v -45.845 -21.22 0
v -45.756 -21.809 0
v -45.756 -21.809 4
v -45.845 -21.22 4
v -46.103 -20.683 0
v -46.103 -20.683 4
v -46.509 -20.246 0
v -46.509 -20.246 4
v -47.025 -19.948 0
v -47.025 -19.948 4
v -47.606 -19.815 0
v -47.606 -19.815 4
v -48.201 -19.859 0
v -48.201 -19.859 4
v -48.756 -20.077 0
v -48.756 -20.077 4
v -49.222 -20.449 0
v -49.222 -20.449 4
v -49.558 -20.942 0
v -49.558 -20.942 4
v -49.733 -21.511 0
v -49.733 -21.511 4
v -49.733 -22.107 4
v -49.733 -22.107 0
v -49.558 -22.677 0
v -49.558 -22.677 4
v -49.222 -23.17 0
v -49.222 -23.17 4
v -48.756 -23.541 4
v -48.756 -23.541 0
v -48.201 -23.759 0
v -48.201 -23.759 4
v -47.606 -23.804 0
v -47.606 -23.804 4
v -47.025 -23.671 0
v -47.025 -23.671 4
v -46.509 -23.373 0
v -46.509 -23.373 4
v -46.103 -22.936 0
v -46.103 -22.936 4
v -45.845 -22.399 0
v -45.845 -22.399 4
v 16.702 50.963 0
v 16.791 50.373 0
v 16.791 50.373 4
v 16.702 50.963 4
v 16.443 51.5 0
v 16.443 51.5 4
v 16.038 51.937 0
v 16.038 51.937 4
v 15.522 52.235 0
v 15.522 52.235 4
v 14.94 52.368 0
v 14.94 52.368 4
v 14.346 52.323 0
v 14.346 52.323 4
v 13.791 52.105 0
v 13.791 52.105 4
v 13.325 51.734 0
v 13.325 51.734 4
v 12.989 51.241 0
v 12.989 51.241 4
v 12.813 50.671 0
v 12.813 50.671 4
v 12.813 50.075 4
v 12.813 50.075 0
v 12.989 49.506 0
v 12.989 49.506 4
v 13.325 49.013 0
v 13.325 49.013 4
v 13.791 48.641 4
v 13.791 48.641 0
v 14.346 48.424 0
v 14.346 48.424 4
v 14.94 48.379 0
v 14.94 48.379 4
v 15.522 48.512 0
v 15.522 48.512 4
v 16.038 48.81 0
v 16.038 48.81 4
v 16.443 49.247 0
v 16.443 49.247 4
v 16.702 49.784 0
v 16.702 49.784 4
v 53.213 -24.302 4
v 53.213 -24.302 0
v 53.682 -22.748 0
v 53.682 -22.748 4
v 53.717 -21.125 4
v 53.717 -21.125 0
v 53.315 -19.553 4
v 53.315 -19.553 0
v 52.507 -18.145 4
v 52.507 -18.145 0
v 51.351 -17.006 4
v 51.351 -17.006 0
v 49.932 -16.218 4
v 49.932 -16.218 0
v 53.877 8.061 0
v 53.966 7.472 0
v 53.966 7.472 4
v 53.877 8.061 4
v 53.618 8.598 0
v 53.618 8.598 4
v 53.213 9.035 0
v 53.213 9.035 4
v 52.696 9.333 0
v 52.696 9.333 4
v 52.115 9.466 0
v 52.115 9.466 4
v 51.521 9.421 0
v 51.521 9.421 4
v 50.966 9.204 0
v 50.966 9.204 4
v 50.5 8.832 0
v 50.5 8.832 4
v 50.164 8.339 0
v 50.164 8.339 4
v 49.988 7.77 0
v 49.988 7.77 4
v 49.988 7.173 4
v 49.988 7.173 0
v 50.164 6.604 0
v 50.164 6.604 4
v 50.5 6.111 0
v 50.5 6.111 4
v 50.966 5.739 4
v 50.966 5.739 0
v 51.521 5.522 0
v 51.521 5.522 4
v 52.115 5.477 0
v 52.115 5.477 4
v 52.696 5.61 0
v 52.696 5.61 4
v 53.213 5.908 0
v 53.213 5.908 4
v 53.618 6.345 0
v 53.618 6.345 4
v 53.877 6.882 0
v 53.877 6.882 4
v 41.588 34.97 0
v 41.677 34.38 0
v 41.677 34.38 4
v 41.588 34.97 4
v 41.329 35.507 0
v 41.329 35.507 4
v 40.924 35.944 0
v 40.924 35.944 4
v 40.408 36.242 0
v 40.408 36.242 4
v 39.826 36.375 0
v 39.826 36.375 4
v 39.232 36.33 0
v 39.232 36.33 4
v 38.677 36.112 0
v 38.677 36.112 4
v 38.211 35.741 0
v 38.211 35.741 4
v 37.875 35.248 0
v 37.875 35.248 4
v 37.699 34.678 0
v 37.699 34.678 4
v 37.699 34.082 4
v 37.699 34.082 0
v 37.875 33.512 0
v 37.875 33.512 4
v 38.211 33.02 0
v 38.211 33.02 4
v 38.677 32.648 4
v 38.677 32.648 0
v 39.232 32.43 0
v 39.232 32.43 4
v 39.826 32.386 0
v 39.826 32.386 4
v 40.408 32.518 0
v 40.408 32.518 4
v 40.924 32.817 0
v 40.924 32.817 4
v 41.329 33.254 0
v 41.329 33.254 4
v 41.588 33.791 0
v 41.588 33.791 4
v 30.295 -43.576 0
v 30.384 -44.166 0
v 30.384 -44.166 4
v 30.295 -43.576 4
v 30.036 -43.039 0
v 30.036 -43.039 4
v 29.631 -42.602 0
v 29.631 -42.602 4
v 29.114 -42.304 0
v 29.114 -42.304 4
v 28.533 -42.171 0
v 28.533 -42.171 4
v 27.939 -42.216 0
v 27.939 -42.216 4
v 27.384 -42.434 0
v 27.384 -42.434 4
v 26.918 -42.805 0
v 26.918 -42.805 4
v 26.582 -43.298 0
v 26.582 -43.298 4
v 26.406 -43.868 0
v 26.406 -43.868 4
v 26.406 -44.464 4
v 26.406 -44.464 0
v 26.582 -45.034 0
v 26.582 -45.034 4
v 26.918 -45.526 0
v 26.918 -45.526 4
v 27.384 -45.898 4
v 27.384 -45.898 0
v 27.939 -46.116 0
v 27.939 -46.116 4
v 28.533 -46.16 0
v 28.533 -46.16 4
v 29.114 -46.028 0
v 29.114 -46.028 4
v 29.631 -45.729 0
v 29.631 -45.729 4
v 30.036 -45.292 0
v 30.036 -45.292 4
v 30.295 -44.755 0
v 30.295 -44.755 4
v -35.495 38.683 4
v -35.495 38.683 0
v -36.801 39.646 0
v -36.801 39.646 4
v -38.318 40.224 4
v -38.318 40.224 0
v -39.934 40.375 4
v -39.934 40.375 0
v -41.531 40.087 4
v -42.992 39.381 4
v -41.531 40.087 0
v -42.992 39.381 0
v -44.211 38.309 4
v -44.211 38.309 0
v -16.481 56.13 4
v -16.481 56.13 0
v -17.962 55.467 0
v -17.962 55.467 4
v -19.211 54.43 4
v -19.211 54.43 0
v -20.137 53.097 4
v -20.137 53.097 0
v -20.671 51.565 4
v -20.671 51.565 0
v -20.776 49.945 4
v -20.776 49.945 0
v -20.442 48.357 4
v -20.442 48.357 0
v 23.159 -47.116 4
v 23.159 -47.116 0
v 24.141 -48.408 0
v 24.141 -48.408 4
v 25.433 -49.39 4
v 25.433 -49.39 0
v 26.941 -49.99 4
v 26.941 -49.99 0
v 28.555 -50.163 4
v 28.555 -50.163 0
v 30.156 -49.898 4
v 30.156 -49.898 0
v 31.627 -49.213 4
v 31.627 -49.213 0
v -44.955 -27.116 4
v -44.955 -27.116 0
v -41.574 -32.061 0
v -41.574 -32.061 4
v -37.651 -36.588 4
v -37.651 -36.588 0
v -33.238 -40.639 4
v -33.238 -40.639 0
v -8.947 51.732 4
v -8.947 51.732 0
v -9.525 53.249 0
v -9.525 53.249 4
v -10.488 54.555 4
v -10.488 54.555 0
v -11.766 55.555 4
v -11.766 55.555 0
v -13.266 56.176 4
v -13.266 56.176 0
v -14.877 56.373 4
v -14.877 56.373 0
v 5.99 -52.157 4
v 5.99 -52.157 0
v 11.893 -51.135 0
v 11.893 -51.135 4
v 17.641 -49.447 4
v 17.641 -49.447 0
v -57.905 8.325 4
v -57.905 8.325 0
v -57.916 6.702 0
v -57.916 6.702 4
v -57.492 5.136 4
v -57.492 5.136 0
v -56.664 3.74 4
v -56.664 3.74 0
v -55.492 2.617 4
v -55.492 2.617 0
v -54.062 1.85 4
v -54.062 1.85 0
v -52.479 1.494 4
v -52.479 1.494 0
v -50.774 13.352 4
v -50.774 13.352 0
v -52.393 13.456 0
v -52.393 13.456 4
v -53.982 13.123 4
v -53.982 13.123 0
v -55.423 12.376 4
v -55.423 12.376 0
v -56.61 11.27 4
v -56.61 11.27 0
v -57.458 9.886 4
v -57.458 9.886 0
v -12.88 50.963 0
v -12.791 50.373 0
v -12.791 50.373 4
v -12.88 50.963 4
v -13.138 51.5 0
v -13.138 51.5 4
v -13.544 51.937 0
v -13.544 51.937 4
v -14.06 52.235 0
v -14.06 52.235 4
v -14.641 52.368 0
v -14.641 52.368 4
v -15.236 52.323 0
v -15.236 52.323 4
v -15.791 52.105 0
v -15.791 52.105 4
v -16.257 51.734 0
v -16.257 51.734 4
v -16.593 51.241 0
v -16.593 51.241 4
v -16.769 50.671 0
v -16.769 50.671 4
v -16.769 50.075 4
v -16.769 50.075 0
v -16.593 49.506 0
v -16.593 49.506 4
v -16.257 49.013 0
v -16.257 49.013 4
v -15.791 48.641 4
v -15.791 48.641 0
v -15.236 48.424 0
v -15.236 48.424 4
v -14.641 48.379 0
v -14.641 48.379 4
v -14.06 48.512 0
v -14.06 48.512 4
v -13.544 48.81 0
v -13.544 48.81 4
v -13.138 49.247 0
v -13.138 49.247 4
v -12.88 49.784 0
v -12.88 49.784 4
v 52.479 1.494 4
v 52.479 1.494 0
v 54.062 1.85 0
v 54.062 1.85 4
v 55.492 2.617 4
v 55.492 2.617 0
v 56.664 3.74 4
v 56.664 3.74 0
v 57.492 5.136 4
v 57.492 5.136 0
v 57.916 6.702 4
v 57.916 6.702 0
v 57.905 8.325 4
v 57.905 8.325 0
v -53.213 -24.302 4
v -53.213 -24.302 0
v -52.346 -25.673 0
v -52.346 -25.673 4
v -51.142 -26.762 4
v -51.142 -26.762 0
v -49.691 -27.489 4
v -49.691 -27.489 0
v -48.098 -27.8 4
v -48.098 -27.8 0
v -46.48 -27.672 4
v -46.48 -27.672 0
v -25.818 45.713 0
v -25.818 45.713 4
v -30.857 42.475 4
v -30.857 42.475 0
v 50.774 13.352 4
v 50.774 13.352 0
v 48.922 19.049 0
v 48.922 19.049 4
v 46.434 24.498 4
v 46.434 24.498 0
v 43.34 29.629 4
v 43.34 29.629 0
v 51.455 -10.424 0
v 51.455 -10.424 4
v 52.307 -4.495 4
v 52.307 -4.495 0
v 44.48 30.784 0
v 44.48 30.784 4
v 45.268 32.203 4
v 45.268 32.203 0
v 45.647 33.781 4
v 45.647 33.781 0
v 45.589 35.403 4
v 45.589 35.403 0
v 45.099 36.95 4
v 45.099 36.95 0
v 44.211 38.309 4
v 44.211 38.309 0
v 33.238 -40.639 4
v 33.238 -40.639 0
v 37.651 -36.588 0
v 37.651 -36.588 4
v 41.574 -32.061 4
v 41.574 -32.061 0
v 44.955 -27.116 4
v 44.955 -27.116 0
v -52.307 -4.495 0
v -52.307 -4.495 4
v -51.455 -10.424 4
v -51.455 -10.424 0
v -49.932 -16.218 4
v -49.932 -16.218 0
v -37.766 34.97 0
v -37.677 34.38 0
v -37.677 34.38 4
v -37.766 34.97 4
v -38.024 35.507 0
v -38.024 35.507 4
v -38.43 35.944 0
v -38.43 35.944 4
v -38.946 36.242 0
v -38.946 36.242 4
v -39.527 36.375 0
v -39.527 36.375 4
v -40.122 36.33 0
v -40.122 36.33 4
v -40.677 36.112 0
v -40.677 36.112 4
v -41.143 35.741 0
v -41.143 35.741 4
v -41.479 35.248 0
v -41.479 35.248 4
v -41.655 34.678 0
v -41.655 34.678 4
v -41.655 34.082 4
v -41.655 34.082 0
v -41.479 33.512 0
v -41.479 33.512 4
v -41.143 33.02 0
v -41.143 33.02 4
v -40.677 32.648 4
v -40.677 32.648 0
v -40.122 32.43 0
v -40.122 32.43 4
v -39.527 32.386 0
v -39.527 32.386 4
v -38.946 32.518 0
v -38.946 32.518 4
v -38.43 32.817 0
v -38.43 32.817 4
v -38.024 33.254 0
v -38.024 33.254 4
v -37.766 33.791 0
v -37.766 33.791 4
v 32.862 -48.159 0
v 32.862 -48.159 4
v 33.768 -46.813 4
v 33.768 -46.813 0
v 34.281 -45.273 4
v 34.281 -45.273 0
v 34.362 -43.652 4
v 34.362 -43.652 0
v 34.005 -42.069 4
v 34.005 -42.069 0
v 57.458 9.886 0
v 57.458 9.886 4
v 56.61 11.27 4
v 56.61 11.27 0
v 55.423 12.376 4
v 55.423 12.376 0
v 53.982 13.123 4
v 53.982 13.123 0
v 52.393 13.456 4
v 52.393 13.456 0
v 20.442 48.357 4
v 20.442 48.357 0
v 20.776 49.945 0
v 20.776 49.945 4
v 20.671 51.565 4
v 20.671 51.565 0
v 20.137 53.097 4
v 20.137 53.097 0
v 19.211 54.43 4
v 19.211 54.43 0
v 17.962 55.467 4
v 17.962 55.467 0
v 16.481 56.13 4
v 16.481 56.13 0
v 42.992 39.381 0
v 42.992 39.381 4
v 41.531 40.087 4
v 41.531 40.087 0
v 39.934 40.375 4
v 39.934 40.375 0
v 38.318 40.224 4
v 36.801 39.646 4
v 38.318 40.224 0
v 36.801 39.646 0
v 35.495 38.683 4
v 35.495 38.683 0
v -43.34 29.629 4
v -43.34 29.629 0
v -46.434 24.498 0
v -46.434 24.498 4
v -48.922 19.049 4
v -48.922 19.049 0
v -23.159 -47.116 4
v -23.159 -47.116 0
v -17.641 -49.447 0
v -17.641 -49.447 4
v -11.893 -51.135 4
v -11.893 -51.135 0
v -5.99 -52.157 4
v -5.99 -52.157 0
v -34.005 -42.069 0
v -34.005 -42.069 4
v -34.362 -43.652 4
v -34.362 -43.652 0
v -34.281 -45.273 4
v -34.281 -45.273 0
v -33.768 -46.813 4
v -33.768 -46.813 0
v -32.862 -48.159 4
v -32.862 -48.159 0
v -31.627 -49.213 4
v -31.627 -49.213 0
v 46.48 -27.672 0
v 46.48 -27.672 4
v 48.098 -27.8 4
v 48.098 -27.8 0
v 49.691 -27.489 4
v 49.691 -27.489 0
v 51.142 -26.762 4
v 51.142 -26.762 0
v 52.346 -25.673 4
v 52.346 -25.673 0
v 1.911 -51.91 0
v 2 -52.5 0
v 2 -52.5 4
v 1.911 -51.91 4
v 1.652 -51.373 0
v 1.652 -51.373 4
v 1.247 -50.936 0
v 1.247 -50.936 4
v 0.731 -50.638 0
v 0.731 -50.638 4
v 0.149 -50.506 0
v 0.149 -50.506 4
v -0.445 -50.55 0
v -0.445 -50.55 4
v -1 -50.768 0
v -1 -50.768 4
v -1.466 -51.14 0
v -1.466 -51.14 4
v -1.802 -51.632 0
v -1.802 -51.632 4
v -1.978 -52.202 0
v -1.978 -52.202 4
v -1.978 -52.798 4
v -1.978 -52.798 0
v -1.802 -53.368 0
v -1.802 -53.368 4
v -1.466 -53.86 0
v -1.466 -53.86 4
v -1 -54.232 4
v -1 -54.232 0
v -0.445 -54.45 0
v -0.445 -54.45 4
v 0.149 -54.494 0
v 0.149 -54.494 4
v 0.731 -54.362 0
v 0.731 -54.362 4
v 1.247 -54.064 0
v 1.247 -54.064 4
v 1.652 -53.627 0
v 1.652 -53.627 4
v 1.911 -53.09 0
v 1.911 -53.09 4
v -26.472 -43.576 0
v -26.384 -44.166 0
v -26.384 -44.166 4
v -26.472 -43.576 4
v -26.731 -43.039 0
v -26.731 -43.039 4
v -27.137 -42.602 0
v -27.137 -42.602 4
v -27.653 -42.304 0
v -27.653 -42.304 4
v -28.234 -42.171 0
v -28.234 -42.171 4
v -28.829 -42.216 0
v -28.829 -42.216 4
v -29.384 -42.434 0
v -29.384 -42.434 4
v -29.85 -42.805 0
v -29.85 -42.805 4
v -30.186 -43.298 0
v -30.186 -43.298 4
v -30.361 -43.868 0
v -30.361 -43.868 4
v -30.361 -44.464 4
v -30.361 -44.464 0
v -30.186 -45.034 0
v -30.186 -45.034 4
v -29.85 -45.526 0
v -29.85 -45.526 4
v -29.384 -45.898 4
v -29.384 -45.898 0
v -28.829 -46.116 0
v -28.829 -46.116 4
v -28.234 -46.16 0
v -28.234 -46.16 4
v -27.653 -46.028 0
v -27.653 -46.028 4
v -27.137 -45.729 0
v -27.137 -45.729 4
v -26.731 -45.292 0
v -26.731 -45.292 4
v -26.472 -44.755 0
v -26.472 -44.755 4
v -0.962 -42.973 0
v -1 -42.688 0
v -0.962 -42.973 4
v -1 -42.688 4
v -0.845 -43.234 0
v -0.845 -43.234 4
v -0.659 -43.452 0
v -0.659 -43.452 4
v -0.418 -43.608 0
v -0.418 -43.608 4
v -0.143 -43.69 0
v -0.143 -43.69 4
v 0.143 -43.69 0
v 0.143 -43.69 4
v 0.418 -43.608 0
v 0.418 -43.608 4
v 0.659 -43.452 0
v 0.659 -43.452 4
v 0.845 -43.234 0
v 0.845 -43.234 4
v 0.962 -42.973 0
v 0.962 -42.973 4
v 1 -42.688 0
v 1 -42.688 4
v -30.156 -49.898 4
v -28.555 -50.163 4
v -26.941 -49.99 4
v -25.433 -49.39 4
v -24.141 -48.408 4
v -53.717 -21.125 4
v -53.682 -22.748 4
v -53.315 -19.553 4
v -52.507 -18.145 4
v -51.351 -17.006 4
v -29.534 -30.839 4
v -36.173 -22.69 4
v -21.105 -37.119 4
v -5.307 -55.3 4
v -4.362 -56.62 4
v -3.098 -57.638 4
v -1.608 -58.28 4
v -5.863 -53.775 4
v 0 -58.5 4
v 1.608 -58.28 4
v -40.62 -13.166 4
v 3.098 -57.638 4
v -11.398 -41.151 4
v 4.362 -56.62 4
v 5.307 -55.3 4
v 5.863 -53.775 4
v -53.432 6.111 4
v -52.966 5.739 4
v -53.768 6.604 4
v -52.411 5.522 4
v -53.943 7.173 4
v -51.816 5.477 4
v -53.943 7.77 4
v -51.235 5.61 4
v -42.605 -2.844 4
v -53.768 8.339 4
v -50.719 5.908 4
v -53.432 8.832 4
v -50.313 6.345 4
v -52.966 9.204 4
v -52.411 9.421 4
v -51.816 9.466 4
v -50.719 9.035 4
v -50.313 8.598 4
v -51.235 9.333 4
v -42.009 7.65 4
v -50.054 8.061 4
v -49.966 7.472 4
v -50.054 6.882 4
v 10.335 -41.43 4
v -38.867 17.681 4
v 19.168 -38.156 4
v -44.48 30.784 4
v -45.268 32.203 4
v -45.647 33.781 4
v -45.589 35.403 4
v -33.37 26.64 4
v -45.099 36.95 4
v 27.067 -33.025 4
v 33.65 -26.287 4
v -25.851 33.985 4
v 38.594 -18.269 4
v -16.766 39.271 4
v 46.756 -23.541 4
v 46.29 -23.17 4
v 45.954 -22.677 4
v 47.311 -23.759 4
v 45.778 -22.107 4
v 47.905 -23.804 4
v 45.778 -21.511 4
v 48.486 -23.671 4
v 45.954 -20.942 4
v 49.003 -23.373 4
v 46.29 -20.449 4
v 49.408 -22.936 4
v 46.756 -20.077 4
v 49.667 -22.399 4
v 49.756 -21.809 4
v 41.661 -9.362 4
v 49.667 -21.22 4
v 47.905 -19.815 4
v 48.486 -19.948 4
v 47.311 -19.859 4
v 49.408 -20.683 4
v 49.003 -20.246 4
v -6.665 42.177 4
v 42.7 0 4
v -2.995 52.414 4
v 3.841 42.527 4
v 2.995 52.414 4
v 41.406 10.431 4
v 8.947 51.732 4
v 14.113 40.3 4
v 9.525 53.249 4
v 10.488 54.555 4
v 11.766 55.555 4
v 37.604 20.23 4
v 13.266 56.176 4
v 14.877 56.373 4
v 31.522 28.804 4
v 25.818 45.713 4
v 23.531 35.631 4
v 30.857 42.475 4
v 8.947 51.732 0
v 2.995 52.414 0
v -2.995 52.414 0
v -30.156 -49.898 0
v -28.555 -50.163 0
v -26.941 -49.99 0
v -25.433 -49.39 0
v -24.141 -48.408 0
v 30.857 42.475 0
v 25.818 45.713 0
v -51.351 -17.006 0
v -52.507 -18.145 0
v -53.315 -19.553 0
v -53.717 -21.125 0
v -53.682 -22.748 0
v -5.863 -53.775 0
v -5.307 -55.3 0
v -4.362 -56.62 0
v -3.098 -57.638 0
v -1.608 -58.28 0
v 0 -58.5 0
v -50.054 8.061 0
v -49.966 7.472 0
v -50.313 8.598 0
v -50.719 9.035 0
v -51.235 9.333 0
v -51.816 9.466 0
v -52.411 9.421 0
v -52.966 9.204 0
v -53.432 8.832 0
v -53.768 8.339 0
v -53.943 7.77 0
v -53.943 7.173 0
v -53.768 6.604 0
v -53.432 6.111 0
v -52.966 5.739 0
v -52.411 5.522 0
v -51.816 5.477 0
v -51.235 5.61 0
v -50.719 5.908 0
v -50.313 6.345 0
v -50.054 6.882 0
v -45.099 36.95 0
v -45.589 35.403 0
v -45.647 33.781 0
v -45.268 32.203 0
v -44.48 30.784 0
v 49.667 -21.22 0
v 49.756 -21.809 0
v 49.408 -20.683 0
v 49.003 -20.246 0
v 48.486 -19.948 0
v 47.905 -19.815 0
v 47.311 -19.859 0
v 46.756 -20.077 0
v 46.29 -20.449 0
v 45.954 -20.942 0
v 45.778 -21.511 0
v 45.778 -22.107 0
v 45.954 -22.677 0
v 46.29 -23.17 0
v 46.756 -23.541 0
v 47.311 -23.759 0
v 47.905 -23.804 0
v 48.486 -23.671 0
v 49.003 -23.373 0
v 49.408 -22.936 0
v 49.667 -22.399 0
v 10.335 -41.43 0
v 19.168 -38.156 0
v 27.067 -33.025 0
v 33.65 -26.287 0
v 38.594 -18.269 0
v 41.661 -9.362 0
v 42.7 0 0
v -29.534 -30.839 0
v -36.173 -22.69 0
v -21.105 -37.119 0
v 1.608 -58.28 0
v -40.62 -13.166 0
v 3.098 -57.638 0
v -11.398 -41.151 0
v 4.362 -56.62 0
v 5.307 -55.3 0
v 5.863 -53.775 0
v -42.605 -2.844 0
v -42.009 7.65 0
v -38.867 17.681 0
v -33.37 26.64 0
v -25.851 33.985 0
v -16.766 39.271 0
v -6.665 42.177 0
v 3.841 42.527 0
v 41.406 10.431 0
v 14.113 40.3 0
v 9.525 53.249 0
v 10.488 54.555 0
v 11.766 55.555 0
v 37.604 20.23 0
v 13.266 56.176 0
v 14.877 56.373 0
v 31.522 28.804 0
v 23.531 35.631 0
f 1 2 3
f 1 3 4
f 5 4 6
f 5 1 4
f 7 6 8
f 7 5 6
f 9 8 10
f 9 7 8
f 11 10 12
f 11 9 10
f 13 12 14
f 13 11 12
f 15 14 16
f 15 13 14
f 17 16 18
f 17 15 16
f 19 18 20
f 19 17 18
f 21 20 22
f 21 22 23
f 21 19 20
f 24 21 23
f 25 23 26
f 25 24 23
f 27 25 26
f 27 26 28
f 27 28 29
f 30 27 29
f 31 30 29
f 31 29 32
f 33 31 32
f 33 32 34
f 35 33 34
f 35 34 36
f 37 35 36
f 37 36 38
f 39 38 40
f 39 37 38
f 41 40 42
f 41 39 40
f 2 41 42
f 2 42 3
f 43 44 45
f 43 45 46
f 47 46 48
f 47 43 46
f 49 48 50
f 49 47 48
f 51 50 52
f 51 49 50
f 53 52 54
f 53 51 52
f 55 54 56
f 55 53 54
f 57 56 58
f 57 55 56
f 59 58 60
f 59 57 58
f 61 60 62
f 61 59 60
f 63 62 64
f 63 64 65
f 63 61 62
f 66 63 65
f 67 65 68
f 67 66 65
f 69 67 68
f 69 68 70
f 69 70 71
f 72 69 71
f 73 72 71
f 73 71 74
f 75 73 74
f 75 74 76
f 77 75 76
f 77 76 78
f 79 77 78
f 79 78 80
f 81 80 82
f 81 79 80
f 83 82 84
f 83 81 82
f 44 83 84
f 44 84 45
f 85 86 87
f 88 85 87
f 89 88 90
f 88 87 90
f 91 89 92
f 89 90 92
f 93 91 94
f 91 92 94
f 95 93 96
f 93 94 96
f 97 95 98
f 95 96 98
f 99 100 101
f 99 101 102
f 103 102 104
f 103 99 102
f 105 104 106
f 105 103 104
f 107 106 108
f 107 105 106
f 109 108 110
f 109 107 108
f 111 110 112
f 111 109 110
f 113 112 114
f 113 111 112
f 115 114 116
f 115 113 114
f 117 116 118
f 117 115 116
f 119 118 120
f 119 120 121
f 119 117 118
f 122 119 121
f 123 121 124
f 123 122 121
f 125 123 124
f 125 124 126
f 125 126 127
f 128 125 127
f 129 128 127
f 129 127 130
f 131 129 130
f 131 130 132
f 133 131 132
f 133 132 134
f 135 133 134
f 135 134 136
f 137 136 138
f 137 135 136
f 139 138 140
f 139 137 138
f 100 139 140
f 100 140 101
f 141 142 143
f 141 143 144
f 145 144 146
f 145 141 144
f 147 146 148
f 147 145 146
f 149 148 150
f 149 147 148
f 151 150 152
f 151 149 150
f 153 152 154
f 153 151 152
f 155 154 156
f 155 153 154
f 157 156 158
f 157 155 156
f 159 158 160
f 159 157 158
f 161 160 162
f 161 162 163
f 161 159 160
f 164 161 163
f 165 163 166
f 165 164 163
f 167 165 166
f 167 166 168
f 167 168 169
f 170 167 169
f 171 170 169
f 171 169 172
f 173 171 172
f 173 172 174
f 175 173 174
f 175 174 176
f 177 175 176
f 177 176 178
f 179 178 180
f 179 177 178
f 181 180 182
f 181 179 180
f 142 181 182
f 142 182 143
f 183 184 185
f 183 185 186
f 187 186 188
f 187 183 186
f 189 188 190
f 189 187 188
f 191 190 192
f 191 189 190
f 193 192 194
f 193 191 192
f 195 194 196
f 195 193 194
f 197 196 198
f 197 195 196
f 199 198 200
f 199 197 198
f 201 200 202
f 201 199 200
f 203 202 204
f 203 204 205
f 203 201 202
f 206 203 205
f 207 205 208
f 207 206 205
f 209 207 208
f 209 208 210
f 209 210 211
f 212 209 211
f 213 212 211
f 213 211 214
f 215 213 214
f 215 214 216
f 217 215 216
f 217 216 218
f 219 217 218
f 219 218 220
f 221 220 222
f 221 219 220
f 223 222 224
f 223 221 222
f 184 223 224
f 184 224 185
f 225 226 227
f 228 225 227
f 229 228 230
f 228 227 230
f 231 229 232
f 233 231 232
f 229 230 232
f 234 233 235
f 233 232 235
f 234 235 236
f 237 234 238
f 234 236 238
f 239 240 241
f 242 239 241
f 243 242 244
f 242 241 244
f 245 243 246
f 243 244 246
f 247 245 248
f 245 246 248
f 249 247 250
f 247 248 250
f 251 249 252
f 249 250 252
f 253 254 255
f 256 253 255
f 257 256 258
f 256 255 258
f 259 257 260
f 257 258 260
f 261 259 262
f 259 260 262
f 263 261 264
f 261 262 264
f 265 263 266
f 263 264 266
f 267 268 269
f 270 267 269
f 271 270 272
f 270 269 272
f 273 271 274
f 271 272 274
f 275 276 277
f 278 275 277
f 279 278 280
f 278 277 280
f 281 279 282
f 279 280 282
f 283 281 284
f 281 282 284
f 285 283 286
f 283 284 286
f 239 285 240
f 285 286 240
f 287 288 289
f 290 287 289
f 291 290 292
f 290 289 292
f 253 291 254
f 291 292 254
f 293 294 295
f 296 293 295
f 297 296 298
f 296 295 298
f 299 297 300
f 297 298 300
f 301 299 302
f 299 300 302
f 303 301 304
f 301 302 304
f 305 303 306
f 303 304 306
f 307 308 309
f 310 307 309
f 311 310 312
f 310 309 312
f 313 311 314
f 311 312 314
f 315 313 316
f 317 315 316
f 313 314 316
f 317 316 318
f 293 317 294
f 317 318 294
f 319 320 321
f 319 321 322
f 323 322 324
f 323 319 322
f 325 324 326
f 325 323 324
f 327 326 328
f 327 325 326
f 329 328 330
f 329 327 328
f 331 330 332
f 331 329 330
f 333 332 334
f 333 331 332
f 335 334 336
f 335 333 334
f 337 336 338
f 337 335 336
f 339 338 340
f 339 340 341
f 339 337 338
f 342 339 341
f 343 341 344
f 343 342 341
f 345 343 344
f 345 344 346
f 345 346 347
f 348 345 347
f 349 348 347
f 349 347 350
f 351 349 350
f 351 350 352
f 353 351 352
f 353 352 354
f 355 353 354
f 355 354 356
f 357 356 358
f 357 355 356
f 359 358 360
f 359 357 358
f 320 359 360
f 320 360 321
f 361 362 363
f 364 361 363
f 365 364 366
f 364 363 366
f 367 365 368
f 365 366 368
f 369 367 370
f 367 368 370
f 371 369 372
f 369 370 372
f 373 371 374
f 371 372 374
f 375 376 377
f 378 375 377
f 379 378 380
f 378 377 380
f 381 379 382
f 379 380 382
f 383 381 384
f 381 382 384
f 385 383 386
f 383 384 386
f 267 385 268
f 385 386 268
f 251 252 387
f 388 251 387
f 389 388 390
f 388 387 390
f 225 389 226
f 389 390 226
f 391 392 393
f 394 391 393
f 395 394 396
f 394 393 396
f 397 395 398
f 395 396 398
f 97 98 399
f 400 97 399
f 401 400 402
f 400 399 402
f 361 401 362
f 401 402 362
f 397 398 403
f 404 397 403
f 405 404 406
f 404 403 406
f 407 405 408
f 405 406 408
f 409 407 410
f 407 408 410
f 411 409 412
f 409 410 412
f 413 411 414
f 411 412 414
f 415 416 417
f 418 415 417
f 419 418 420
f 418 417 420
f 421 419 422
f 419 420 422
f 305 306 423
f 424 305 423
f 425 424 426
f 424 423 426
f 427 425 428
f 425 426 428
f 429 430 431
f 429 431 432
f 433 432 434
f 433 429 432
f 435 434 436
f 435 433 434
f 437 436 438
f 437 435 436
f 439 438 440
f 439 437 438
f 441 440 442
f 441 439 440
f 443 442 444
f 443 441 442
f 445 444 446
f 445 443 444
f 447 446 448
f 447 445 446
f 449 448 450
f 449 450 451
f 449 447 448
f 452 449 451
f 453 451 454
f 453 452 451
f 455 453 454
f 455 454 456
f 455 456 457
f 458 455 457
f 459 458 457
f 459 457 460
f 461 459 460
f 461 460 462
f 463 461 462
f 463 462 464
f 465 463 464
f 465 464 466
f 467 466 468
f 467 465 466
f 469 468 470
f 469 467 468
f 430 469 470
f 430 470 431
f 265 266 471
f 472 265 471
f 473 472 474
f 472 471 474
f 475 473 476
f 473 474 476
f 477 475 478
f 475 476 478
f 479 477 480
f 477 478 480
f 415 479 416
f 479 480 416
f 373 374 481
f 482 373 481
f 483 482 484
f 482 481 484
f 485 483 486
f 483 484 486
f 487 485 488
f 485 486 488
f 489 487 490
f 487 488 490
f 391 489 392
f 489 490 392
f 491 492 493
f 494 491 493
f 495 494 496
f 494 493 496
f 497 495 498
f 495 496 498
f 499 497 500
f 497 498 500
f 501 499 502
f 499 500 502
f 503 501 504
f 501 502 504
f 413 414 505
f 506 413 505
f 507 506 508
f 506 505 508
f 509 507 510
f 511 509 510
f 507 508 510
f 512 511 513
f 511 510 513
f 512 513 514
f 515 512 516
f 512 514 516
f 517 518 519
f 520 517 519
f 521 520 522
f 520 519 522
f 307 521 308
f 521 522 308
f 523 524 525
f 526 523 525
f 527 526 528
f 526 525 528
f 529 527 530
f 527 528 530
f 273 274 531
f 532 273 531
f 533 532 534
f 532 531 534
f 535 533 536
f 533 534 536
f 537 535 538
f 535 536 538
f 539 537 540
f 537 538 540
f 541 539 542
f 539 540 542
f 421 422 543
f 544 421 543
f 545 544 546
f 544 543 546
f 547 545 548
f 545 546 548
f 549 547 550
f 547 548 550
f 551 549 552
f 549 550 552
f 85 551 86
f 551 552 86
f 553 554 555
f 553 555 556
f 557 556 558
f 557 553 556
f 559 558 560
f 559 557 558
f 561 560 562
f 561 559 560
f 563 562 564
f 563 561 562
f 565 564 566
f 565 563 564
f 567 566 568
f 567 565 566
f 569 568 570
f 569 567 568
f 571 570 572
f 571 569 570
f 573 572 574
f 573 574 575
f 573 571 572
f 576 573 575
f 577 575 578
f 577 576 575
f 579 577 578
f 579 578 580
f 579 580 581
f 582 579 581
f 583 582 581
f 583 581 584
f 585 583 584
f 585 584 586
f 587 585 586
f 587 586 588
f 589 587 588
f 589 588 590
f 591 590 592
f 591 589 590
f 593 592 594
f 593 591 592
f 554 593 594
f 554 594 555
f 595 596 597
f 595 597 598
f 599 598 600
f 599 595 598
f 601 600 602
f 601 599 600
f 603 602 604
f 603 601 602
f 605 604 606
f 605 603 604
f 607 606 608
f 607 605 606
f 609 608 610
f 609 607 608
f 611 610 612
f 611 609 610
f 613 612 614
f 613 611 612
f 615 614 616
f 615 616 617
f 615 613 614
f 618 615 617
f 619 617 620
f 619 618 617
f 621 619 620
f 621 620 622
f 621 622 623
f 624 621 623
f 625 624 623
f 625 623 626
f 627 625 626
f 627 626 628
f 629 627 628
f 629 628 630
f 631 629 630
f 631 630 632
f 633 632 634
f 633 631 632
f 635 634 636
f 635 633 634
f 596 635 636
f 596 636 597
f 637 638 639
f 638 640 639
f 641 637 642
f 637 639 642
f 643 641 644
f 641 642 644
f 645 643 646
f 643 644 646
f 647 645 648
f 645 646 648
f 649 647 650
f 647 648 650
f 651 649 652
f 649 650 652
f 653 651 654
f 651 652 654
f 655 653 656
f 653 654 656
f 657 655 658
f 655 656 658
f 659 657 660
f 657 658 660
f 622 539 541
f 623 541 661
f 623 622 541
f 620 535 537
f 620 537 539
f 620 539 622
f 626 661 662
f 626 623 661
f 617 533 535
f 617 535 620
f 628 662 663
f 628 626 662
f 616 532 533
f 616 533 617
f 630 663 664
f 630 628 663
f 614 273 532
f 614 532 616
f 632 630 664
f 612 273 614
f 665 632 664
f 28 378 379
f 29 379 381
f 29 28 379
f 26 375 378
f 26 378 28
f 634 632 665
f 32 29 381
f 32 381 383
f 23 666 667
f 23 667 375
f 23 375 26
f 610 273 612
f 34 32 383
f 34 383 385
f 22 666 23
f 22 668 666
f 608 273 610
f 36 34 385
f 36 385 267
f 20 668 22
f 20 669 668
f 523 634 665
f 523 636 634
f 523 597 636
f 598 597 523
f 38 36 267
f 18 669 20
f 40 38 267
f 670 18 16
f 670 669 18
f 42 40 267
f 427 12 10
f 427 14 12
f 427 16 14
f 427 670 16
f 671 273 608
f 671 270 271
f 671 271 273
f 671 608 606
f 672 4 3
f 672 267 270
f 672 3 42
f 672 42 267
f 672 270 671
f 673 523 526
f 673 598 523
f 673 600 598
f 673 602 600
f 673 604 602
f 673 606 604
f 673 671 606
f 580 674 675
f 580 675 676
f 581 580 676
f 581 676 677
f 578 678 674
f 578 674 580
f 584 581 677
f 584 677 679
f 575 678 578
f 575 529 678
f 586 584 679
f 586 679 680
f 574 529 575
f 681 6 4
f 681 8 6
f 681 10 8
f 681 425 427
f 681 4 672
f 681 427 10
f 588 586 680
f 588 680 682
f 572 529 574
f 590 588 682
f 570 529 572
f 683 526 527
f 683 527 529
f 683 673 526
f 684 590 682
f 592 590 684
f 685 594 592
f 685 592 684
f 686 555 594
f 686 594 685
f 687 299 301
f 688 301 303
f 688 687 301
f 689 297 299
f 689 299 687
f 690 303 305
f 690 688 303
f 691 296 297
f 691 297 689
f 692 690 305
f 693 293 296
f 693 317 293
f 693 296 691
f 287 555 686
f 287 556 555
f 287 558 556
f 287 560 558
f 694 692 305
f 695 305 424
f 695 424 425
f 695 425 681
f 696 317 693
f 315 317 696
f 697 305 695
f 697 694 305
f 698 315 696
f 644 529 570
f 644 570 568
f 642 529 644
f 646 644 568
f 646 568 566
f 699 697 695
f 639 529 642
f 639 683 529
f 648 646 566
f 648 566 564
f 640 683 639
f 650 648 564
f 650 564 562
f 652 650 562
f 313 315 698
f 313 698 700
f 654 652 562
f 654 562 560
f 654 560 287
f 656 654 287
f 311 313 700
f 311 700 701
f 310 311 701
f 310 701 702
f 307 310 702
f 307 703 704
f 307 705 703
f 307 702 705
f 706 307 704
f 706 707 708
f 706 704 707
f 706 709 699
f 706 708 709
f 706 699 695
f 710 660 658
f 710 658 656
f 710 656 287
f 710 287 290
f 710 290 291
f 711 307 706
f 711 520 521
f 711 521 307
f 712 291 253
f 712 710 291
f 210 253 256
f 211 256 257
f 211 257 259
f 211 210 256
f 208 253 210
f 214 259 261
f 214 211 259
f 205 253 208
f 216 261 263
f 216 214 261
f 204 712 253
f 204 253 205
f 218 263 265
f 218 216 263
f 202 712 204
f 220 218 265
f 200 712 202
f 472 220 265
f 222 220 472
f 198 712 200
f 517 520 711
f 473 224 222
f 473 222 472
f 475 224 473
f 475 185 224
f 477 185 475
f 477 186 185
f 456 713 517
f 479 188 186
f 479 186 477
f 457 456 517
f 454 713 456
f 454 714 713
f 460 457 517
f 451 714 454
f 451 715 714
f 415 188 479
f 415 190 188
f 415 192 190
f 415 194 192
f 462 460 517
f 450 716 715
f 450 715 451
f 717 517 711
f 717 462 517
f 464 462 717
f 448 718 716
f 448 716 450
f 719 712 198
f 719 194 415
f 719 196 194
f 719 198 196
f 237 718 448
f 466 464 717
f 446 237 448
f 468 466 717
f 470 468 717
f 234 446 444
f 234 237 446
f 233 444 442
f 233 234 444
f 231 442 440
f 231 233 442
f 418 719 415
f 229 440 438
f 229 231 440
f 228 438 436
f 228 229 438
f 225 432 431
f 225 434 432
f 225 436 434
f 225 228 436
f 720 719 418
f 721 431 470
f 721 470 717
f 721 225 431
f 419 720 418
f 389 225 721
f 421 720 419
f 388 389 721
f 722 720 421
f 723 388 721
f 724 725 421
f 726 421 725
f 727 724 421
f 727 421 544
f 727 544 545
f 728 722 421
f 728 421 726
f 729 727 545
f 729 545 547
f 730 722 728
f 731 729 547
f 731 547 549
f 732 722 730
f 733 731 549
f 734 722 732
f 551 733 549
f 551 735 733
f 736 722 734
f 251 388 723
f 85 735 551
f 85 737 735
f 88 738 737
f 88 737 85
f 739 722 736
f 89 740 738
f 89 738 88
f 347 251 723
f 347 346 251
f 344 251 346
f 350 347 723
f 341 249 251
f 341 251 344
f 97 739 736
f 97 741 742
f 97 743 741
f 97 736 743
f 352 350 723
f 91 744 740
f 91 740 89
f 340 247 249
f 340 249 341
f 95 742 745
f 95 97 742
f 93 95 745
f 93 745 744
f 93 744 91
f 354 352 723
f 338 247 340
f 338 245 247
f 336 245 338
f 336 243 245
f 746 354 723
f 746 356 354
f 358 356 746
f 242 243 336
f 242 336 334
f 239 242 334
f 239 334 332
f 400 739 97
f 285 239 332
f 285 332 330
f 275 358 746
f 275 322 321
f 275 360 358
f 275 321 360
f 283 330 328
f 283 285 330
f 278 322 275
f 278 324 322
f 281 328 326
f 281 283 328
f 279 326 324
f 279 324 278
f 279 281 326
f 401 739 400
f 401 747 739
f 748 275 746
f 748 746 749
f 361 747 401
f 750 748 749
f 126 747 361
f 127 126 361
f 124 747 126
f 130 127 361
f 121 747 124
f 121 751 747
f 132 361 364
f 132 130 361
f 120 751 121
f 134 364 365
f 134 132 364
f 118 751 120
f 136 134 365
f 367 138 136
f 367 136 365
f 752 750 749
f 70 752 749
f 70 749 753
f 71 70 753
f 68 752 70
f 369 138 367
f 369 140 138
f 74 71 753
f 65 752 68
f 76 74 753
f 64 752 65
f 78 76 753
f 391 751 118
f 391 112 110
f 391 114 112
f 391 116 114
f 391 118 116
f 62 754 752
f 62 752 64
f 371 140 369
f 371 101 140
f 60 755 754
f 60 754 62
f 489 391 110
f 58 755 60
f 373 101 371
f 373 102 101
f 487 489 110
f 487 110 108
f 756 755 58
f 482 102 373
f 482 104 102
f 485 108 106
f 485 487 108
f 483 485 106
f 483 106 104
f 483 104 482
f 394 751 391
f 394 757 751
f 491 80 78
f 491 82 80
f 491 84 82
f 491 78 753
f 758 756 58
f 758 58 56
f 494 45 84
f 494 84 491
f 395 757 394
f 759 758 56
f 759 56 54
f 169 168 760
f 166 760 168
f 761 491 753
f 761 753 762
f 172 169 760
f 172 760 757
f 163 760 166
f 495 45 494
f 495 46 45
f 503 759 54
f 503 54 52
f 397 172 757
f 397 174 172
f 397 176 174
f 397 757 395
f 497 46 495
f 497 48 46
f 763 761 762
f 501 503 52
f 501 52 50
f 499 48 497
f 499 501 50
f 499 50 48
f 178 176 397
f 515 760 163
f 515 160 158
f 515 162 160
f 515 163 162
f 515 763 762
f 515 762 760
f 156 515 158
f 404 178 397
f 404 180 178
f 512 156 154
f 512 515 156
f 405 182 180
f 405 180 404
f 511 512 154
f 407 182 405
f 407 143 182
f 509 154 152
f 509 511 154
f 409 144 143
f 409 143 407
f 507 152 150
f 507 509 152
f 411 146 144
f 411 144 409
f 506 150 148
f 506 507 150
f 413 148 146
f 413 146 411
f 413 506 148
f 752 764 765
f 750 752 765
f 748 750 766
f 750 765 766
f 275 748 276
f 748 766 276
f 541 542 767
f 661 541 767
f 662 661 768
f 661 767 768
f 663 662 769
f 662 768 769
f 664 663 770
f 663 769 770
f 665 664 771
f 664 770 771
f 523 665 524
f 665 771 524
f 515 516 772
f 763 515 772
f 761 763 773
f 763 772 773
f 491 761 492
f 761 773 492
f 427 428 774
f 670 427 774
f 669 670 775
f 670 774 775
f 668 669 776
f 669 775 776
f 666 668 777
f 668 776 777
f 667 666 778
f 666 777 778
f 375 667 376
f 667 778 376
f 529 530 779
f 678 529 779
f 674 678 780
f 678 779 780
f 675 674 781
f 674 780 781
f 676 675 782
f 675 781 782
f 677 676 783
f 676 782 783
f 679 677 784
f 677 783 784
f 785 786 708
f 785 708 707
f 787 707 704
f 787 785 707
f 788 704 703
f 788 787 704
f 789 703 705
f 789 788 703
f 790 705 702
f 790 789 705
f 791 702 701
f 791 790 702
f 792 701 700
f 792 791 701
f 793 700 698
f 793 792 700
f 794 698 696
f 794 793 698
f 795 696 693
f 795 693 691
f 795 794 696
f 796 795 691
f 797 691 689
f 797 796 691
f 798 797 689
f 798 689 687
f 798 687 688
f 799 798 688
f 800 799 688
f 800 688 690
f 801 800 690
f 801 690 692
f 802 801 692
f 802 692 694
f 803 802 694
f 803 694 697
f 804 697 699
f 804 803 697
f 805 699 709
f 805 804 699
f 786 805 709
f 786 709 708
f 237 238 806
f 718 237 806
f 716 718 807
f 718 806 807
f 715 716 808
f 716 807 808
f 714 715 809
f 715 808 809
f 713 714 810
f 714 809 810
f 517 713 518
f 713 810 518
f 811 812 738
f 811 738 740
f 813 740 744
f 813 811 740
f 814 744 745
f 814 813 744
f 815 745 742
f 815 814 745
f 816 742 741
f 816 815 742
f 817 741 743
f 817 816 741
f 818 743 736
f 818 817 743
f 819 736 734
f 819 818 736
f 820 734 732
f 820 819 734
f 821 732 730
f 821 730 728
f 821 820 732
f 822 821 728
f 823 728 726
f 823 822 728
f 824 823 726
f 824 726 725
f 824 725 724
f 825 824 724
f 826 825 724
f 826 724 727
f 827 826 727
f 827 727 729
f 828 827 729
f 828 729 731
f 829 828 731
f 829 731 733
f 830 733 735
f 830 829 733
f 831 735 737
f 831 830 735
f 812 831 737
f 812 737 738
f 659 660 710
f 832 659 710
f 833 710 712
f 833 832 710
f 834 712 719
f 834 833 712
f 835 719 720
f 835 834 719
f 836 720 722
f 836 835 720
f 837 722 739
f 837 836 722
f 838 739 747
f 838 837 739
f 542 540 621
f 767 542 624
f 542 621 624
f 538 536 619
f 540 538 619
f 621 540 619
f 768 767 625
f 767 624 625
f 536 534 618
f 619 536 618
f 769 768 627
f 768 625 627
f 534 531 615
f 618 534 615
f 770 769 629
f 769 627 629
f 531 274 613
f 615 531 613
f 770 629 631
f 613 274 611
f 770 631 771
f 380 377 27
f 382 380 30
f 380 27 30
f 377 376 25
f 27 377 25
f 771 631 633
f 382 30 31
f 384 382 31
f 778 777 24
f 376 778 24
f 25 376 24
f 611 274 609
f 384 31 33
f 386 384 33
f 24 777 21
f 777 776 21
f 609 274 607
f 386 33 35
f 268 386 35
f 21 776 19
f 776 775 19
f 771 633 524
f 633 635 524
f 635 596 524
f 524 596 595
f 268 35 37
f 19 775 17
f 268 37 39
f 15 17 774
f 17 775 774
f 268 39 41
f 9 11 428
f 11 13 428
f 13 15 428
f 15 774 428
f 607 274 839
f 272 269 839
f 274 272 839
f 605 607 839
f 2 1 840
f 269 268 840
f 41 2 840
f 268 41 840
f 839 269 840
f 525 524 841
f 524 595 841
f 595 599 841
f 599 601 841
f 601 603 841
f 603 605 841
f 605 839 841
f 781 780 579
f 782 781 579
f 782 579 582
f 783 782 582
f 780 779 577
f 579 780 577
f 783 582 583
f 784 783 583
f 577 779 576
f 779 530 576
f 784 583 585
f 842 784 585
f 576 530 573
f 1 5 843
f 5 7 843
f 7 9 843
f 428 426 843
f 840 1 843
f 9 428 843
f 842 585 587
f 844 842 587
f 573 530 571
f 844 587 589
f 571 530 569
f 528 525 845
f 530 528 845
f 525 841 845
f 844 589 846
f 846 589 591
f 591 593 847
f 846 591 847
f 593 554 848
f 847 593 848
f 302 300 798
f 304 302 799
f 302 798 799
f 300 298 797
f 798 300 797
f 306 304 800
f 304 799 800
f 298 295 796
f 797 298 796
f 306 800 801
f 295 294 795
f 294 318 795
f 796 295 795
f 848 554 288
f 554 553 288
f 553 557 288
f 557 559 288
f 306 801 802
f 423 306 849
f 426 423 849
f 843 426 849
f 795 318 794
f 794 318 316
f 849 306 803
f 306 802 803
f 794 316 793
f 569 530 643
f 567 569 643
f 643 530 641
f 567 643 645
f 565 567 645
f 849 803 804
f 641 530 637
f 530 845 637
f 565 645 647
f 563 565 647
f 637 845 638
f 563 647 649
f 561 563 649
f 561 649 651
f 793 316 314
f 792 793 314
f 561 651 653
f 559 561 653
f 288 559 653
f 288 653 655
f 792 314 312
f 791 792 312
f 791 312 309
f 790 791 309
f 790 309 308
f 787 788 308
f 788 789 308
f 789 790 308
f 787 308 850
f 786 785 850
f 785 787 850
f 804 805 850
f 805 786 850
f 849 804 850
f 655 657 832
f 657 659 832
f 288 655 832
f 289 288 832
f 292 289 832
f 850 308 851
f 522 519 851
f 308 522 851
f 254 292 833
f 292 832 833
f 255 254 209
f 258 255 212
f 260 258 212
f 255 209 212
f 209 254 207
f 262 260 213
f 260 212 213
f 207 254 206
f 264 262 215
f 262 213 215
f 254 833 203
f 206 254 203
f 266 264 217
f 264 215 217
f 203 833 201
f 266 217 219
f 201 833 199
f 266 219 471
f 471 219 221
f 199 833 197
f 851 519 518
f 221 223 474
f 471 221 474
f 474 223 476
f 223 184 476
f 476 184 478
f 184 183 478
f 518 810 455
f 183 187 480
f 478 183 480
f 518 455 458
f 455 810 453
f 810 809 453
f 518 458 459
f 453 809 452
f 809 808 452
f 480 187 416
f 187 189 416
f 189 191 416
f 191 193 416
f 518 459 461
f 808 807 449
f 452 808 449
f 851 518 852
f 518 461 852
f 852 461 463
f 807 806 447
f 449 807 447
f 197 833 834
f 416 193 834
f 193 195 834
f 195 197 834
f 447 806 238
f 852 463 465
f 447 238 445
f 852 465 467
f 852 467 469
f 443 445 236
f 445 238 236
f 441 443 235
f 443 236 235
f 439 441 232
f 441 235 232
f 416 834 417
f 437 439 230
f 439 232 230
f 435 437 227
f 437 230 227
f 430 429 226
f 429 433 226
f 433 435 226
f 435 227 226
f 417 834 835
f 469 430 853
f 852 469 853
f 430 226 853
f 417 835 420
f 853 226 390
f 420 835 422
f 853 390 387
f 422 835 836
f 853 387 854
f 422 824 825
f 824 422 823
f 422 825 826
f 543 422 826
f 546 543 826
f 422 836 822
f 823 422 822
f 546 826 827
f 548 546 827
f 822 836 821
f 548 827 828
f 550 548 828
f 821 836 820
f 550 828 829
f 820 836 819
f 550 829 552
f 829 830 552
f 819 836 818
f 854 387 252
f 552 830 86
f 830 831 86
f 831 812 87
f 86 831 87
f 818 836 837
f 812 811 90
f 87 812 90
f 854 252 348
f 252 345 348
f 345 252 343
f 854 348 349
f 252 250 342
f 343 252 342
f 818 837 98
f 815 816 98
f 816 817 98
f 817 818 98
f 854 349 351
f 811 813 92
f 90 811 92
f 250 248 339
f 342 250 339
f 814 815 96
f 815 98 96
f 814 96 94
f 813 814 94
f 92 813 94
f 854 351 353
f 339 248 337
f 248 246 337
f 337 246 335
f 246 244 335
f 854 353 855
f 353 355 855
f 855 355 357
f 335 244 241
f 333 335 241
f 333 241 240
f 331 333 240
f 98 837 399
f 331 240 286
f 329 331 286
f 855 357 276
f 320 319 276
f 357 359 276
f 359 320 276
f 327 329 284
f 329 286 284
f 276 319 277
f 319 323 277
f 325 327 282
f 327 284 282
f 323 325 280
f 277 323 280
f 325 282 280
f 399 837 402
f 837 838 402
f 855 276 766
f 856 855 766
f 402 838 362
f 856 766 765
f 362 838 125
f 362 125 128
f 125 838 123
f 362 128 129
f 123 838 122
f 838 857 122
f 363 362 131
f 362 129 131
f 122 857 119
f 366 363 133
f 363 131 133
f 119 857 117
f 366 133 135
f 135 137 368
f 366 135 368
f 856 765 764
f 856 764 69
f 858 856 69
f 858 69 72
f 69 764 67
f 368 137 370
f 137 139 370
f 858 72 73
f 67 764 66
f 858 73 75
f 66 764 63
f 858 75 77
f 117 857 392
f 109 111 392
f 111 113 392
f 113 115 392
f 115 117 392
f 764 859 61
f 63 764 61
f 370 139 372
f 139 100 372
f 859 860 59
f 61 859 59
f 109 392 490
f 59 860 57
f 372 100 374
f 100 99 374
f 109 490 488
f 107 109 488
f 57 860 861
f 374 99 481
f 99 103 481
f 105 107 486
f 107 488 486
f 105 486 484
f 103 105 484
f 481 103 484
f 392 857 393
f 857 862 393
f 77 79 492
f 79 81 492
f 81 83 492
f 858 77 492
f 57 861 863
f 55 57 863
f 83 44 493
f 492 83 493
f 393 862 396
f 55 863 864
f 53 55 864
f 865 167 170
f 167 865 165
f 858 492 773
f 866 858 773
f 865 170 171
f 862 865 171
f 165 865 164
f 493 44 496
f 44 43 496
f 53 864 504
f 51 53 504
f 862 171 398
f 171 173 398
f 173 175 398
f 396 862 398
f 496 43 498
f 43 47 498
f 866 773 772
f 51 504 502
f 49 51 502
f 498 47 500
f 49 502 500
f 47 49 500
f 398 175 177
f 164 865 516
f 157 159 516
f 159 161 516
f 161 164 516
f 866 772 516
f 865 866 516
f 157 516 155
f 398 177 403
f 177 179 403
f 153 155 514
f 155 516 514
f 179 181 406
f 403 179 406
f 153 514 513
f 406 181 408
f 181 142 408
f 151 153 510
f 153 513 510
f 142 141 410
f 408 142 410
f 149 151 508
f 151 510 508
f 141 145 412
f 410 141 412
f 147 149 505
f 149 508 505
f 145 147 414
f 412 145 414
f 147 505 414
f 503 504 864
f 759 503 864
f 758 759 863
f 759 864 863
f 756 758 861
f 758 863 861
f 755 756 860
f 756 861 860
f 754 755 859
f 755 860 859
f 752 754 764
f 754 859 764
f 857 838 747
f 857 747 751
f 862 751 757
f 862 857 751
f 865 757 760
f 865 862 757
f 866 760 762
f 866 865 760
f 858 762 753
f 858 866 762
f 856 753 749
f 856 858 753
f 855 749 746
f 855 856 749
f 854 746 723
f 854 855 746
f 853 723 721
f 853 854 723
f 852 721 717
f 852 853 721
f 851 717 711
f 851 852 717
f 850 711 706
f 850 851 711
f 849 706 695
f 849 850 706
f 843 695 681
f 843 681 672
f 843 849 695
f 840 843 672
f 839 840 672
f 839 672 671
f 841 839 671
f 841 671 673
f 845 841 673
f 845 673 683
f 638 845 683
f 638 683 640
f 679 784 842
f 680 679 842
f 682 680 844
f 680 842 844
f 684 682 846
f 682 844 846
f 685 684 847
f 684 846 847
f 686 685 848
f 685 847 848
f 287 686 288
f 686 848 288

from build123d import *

# Parameters (mm, degrees)
SKETCH_1_R          = 42.7
SKETCH_1_R_2        = 2
EXTRUDE_1_DEPTH     = 4
SKETCH_2_R          = 1
CUT_EXTRUDE_1_DEPTH = 4


with BuildPart() as part:
    # 草图1 → 凸台-拉伸1 (new body)
    with BuildSketch(Plane.XY):
        with BuildLine():
            ThreePointArc((-57.90455435, 8.325418039), (-56.664135325, 3.740040393), (-52.478752132, 1.493510837))
            ThreePointArc((-52.478752132, 1.493510837), (-51.965625699, -7.471529009), (-49.932223308, -16.217986173))
            ThreePointArc((-49.932223308, -16.217986173), (-53.315148558, -19.552674205), (-53.213471728, -24.301778261))
            ThreePointArc((-53.213471728, -24.301778261), (-49.690922522, -27.488622249), (-44.95538855, -27.115734184))
            ThreePointArc((-44.95538855, -27.115734184), (-39.676852654, -34.380188532), (-33.237553958, -40.63883619))
            ThreePointArc((-33.237553958, -40.63883619), (-34.280583312, -45.27310175), (-31.627487821, -49.213331671))
            ThreePointArc((-31.627487821, -49.213331671), (-26.941192918, -49.989841552), (-23.159006743, -47.115925192))
            ThreePointArc((-23.159006743, -47.115925192), (-14.790959234, -50.373381115), (-5.990196072, -52.157142857))
            ThreePointArc((-5.990196072, -52.157142857), (-4.36217508, -56.619639374), (0, -58.5))
            ThreePointArc((0, -58.5), (4.36217508, -56.619639374), (5.990196072, -52.157142857))
            ThreePointArc((5.990196072, -52.157142857), (14.790959234, -50.373381115), (23.159006743, -47.115925192))
            ThreePointArc((23.159006743, -47.115925192), (26.941192918, -49.989841552), (31.627487821, -49.213331671))
            ThreePointArc((31.627487821, -49.213331671), (34.280583312, -45.27310175), (33.237553958, -40.63883619))
            ThreePointArc((33.237553958, -40.63883619), (39.676852654, -34.380188532), (44.95538855, -27.115734184))
            ThreePointArc((44.95538855, -27.115734184), (49.690922522, -27.488622249), (53.213471728, -24.301778261))
            ThreePointArc((53.213471728, -24.301778261), (53.315148558, -19.552674205), (49.932223308, -16.217986173))
            ThreePointArc((49.932223308, -16.217986173), (51.965625699, -7.471529009), (52.478752132, 1.493510837))
            ThreePointArc((52.478752132, 1.493510837), (56.664135325, 3.740040393), (57.90455435, 8.325418039))
            ThreePointArc((57.90455435, 8.325418039), (55.422530843, 12.375589248), (50.773764562, 13.351959864))
            ThreePointArc((50.773764562, 13.351959864), (47.755679756, 21.809288183), (43.34048271, 29.62857672))
            ThreePointArc((43.34048271, 29.62857672), (45.646885531, 33.781266636), (44.2113501, 38.309352936))
            ThreePointArc((44.2113501, 38.309352936), (39.933651182, 40.374690556), (35.494994318, 38.682752984))
            ThreePointArc((35.494994318, 38.682752984), (28.383642916, 44.165810474), (20.441916256, 48.35677884))
            ThreePointArc((20.441916256, 48.35677884), (20.137072107, 53.097179409), (16.481354575, 56.130338956))
            ThreePointArc((16.481354575, 56.130338956), (11.766119429, 55.555112887), (8.946814173, 51.732045351))
            ThreePointArc((8.946814173, 51.732045351), (0, 52.5), (-8.946814173, 51.732045351))
            ThreePointArc((-8.946814173, 51.732045351), (-11.766119429, 55.555112887), (-16.481354575, 56.130338956))
            ThreePointArc((-16.481354575, 56.130338956), (-20.137072107, 53.097179409), (-20.441916256, 48.35677884))
            ThreePointArc((-20.441916256, 48.35677884), (-28.383642916, 44.165810474), (-35.494994318, 38.682752984))
            ThreePointArc((-35.494994318, 38.682752984), (-39.933651182, 40.374690556), (-44.2113501, 38.309352936))
            ThreePointArc((-44.2113501, 38.309352936), (-45.646885531, 33.781266636), (-43.34048271, 29.62857672))
            ThreePointArc((-43.34048271, 29.62857672), (-47.755679756, 21.809288183), (-50.773764562, 13.351959864))
            ThreePointArc((-50.773764562, 13.351959864), (-55.422530843, 12.375589248), (-57.90455435, 8.325418039))
        make_face()
        Circle(SKETCH_1_R, mode=Mode.SUBTRACT)
        with Locations((-51.965625699, 7.471529009)):
            Circle(SKETCH_1_R_2, mode=Mode.SUBTRACT)
        with Locations((-39.676852654, 34.380188532)):
            Circle(SKETCH_1_R_2, mode=Mode.SUBTRACT)
        with Locations((-14.790959234, 50.373381115)):
            Circle(SKETCH_1_R_2, mode=Mode.SUBTRACT)
        with Locations((14.790959234, 50.373381115)):
            Circle(SKETCH_1_R_2, mode=Mode.SUBTRACT)
        with Locations((39.676852654, 34.380188532)):
            Circle(SKETCH_1_R_2, mode=Mode.SUBTRACT)
        with Locations((51.965625699, 7.471529009)):
            Circle(SKETCH_1_R_2, mode=Mode.SUBTRACT)
        with Locations((47.755679756, -21.809288183)):
            Circle(SKETCH_1_R_2, mode=Mode.SUBTRACT)
        with Locations((28.383642916, -44.165810474)):
            Circle(SKETCH_1_R_2, mode=Mode.SUBTRACT)
        with Locations((0, -52.5)):
            Circle(SKETCH_1_R_2, mode=Mode.SUBTRACT)
        with Locations((-28.383642916, -44.165810474)):
            Circle(SKETCH_1_R_2, mode=Mode.SUBTRACT)
        with Locations((-47.755679756, -21.809288183)):
            Circle(SKETCH_1_R_2, mode=Mode.SUBTRACT)
    extrude(amount=EXTRUDE_1_DEPTH)

    # 草图2 → 切除-拉伸1 (cut)
    with BuildSketch(Plane.XY.offset(4)):
        with Locations((0, -42.7)):
            Circle(SKETCH_2_R)
    extrude(amount=-CUT_EXTRUDE_1_DEPTH, mode=Mode.SUBTRACT)


solid = part.part
